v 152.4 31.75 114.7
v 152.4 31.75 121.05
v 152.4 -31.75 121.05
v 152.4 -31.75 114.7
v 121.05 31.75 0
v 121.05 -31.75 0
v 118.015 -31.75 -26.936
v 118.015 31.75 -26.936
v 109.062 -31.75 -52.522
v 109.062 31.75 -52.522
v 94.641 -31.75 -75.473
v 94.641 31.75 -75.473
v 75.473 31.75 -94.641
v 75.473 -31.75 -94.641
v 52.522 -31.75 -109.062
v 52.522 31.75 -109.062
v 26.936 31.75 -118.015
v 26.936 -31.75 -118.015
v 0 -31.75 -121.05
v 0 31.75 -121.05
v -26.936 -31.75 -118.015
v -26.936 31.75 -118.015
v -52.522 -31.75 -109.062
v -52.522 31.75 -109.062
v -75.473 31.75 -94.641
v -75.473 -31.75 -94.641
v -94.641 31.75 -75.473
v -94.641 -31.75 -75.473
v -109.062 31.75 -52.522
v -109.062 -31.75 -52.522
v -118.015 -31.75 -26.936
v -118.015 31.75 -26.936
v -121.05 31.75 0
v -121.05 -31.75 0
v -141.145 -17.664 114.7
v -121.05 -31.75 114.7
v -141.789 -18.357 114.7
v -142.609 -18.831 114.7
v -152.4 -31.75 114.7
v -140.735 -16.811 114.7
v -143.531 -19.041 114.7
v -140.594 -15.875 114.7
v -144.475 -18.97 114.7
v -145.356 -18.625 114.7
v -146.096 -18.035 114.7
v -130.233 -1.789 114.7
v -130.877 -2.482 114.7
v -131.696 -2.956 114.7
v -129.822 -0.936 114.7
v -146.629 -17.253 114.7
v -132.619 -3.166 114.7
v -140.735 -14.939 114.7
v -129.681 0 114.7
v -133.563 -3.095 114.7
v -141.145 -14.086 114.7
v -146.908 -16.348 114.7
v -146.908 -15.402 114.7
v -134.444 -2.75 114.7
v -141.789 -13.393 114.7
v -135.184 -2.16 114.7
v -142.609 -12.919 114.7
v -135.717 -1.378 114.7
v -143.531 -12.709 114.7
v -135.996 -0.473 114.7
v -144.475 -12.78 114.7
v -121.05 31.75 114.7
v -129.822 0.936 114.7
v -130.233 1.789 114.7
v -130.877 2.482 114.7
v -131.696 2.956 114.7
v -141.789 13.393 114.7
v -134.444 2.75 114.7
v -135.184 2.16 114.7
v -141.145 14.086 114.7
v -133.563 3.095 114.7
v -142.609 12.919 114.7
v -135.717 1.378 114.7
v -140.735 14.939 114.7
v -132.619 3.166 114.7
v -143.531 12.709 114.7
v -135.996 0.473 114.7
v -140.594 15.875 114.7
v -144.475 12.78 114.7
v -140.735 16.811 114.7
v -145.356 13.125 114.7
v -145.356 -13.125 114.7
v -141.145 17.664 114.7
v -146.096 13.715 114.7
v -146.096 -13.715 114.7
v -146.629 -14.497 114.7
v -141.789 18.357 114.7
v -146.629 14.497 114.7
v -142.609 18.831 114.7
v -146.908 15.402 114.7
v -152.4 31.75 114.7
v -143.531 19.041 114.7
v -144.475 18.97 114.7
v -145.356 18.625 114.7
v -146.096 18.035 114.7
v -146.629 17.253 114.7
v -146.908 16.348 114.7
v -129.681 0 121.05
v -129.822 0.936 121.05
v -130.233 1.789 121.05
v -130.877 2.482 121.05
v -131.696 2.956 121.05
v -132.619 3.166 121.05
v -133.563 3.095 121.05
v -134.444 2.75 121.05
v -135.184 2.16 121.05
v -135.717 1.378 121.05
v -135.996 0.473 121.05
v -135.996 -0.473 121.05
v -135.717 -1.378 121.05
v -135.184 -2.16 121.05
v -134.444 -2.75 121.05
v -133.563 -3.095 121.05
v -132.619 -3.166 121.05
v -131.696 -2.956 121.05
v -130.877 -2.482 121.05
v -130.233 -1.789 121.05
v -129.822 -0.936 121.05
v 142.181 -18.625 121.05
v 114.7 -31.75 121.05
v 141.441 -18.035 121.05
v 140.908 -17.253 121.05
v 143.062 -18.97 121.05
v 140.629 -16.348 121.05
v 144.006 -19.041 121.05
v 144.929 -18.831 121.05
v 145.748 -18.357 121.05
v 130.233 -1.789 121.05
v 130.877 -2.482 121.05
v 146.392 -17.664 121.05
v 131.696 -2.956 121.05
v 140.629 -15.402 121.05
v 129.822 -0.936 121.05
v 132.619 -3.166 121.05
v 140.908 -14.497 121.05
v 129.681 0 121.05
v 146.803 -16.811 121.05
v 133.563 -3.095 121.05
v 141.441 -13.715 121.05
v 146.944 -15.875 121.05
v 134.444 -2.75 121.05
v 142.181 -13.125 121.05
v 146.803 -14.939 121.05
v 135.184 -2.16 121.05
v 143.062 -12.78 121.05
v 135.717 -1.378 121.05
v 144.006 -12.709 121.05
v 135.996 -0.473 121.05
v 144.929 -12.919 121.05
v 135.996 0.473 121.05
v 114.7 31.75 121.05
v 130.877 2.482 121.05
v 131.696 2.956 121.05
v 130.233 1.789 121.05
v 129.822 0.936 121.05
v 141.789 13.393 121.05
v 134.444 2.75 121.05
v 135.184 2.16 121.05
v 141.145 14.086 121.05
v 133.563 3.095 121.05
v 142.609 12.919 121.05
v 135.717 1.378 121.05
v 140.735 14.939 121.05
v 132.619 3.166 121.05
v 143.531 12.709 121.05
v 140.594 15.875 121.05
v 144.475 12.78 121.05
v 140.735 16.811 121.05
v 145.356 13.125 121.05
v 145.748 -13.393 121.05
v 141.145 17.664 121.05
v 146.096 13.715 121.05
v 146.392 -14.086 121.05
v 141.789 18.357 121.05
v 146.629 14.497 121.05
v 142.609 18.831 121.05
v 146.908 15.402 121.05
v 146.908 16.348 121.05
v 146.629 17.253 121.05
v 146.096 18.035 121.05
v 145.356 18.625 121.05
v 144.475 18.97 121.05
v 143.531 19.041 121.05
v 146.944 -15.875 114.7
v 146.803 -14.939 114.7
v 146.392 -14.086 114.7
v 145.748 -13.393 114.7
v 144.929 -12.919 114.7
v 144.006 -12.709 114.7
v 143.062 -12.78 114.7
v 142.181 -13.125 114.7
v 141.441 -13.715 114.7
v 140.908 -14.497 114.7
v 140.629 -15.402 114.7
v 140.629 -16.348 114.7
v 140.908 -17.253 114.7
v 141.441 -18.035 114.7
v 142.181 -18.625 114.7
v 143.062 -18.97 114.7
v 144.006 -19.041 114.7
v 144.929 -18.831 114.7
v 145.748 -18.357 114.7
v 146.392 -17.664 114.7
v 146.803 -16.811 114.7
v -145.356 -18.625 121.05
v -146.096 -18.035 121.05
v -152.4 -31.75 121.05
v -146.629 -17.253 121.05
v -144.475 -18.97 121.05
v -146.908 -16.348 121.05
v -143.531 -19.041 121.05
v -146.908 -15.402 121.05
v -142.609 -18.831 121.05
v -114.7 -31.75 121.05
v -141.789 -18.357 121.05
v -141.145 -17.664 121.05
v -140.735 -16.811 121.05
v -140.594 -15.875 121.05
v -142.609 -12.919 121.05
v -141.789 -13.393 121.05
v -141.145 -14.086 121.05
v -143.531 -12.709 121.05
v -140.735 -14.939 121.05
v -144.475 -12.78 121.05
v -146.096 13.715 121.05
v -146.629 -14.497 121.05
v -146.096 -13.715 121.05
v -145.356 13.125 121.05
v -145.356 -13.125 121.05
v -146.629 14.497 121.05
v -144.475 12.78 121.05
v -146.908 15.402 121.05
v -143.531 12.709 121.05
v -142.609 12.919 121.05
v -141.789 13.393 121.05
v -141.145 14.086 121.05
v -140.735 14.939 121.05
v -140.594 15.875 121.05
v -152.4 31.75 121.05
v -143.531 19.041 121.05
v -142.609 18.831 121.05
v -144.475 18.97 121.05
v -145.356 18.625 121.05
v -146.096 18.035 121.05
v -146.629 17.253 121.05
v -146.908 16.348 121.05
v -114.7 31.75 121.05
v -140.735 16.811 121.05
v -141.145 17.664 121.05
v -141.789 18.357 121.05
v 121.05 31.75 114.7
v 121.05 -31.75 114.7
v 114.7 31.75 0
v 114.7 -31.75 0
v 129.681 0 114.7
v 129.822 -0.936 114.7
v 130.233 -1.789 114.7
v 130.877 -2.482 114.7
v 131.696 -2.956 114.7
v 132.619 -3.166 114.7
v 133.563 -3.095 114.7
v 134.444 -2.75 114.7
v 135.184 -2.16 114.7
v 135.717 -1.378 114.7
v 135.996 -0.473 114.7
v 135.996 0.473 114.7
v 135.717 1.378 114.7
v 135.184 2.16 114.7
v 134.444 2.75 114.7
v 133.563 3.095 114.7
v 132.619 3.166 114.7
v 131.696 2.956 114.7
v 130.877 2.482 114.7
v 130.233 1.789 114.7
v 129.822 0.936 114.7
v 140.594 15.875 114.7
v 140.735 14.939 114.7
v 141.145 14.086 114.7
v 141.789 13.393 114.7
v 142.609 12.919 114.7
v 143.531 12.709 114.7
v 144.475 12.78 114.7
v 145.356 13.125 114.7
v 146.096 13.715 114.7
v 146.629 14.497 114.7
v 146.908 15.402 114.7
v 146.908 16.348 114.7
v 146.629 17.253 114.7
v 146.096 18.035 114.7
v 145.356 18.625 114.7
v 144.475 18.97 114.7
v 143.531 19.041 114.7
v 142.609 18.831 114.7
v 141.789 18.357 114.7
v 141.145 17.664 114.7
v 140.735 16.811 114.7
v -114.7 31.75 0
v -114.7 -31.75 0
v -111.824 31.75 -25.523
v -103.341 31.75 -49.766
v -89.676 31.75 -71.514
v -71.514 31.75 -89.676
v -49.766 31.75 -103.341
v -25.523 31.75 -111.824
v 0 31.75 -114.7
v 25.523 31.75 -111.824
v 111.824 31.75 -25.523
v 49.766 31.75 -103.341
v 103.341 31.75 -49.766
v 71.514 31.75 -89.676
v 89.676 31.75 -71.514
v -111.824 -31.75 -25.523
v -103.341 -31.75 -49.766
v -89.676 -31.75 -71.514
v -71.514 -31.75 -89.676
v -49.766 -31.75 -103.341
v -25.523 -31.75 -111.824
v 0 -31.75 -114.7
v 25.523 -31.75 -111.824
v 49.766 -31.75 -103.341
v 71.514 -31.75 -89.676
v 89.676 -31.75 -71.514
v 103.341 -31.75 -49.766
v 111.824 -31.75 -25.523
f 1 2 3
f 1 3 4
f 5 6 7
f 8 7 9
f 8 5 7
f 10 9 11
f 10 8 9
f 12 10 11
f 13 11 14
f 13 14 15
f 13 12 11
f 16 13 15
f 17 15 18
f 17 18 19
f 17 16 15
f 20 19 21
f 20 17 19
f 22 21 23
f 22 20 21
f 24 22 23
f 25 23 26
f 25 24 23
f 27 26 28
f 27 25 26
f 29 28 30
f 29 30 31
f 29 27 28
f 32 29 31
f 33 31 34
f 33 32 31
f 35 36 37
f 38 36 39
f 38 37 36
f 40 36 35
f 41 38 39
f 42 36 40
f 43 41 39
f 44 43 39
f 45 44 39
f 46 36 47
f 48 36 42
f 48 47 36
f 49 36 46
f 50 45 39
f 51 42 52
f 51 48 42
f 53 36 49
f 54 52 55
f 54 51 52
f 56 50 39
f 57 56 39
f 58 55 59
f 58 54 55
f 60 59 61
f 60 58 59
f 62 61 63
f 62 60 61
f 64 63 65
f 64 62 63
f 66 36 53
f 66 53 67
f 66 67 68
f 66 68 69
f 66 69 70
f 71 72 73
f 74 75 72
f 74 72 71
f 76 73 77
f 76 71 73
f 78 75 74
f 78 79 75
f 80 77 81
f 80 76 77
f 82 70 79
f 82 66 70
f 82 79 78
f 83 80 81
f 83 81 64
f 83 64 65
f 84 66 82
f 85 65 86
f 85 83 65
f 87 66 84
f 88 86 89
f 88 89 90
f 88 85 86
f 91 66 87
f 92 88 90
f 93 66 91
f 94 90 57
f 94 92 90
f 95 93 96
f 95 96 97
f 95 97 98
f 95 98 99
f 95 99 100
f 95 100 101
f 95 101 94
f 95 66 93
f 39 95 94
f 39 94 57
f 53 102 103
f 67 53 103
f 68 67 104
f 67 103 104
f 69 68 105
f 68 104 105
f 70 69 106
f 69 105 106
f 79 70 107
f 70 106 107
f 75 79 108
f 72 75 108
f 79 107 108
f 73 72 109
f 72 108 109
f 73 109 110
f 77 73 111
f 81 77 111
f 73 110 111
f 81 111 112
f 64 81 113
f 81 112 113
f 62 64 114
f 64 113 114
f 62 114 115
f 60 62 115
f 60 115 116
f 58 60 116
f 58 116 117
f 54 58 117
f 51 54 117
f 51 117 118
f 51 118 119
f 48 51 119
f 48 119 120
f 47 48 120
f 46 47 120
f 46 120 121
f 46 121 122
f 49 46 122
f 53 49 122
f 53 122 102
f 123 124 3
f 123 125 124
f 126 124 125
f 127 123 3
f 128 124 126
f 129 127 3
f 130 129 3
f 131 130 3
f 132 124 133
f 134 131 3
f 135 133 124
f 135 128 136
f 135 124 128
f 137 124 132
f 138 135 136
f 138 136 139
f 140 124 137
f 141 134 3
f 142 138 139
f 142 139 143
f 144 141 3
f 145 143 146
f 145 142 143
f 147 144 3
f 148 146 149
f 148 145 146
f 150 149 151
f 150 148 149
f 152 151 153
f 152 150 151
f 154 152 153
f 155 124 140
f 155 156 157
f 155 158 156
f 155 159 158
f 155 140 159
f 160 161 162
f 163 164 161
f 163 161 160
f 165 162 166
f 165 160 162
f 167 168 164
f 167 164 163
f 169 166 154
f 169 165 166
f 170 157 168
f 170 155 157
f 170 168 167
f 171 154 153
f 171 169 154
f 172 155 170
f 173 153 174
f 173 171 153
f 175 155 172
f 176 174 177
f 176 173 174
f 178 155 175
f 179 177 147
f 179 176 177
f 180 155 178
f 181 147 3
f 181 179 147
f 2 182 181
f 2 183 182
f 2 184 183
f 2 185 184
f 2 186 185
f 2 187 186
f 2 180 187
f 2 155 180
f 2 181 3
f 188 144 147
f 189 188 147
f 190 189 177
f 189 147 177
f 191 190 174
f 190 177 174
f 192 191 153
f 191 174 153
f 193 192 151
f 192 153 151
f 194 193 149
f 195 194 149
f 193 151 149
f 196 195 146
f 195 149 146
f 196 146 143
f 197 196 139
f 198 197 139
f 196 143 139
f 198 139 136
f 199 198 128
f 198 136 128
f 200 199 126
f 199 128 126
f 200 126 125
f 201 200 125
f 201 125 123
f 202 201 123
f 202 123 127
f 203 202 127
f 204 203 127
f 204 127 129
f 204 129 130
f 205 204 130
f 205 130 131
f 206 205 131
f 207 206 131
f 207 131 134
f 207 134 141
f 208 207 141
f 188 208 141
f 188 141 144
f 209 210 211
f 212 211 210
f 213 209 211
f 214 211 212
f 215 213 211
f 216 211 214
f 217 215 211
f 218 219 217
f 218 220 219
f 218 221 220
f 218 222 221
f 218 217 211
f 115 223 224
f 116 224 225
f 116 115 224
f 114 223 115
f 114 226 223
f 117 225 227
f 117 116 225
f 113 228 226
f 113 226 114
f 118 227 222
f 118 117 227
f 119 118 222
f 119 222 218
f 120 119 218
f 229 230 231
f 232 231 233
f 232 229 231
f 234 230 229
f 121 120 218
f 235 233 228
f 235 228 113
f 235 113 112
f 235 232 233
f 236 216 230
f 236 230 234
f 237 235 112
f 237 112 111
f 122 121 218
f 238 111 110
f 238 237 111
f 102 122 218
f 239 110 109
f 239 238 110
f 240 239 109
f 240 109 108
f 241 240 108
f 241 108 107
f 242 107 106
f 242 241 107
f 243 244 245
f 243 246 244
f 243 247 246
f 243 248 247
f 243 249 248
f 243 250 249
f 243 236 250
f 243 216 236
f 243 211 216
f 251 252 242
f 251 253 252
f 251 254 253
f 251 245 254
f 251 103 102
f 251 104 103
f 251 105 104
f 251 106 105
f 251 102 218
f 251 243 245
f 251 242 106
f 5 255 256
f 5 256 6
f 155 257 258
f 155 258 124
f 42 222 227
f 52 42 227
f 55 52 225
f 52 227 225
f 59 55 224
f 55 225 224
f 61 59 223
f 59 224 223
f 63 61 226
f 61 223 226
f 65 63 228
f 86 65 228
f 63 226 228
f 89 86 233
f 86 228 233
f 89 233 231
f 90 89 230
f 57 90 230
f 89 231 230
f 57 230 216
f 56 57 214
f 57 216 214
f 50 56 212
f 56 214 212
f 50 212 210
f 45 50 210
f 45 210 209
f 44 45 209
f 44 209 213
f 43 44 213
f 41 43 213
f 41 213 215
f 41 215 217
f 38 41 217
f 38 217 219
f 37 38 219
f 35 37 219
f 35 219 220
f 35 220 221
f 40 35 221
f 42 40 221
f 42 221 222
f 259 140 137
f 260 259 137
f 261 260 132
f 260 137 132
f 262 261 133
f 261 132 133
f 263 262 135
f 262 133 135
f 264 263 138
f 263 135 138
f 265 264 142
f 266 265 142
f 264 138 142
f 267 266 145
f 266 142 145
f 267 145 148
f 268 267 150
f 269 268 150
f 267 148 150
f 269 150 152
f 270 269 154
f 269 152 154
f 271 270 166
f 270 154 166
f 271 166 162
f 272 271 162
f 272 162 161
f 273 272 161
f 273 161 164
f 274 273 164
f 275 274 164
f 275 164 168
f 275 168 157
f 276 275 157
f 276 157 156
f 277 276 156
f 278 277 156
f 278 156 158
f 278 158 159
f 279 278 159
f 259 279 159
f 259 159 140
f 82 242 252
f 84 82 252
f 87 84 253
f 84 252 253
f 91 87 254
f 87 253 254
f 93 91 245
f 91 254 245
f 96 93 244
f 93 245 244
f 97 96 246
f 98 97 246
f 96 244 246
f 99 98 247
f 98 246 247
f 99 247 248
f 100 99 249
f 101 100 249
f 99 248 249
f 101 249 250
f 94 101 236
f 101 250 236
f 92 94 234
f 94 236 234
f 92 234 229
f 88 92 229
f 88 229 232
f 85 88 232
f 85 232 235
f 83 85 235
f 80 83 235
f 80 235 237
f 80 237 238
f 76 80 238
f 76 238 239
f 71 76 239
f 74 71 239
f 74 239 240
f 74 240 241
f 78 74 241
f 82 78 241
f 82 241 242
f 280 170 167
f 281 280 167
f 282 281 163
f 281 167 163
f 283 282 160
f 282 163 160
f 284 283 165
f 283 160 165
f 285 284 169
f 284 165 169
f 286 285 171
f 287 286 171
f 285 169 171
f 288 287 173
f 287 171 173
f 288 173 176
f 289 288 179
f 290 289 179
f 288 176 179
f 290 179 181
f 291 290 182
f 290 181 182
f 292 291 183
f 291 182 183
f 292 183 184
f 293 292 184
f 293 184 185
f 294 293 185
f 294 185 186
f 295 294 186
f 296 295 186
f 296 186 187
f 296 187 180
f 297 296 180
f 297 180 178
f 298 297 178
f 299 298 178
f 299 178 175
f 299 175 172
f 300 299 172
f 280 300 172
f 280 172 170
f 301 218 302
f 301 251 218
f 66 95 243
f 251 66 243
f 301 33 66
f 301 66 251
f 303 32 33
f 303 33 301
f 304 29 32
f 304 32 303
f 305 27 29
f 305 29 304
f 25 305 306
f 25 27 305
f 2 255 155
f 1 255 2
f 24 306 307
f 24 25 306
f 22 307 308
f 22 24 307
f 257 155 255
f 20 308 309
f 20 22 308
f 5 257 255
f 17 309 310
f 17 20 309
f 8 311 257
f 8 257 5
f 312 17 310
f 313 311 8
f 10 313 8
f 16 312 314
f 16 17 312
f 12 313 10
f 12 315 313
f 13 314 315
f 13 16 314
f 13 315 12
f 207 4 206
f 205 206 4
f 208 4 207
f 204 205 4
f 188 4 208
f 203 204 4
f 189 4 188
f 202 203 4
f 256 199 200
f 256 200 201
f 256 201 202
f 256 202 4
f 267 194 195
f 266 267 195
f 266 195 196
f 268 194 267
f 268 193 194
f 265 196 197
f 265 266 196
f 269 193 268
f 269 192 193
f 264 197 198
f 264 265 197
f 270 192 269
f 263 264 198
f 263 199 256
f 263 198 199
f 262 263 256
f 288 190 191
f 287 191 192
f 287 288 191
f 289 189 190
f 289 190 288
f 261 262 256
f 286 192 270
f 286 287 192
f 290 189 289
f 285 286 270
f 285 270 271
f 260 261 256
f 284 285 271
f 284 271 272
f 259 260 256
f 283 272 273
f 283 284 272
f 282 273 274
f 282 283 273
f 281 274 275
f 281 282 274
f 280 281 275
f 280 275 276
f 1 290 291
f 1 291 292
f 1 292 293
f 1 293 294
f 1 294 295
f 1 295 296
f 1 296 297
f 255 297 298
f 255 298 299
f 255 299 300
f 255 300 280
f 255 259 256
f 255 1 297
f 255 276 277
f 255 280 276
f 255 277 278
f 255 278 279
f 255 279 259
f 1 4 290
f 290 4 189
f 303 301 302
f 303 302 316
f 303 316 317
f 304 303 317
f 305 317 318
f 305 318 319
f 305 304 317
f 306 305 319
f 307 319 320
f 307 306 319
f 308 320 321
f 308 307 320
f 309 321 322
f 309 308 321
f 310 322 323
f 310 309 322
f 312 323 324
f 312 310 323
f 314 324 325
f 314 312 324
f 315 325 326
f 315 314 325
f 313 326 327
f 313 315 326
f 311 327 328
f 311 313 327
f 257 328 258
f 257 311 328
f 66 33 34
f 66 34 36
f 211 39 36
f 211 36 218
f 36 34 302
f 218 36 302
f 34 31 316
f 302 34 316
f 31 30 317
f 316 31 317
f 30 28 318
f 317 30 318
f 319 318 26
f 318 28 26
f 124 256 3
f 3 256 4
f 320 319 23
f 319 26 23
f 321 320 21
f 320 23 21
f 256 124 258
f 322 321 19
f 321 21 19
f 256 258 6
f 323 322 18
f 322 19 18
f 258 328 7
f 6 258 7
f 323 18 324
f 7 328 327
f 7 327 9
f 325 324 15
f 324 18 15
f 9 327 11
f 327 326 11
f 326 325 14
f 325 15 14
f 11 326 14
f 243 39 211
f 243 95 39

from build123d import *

# Parameters (mm, degrees)
BOSS_EXTRUDE1_DEPTH = 31.75
SKETCH15_R          = 3.175
CUT_EXTRUDE1_DEPTH  = 288.83021471


with BuildPart() as part:
    # Sketch1 → Boss-Extrude1 (new, symmetric)
    with BuildSketch(Plane(origin=(0, 0, 0), x_dir=(1, 0, 0), z_dir=(0, 1, 0))):
        with BuildLine():
            Line((-114.7, -121.05), (-114.7, 0))
            ThreePointArc((-114.7, 0), (0, 114.7), (114.7, 0))
            Line((114.7, 0), (114.7, -121.05))
            Line((114.7, -121.05), (152.4, -121.05))
            Line((152.4, -121.05), (152.4, -114.7))
            Line((152.4, -114.7), (121.05, -114.7))
            Line((121.05, -114.7), (121.05, 0))
            ThreePointArc((121.05, 0), (0, 121.05), (-121.05, 0))
            Line((-121.05, 0), (-121.05, -12.7))
            Line((-121.05, -12.7), (-121.05, -114.7))
            Line((-121.05, -114.7), (-152.4, -114.7))
            Line((-152.4, -114.7), (-152.4, -121.05))
            Line((-152.4, -121.05), (-114.7, -121.05))
        make_face()
    extrude(amount=BOSS_EXTRUDE1_DEPTH, both=True)

    # Sketch15 → Cut-Extrude1 (cut, through all)
    with BuildSketch(Plane.XY.offset(121.05)):
        with Locations((-143.76875, 15.875)):
            Circle(SKETCH15_R)
        with Locations((-143.76875, -15.875)):
            Circle(SKETCH15_R)
        with Locations((-132.85625, 0)):
            Circle(SKETCH15_R)
        with Locations(Location((132.85625, 0, 0), (0, 0, 180))):
            Circle(SKETCH15_R)
        with Locations((143.76875, -15.875)):
            Circle(SKETCH15_R)
        with Locations(Location((143.76875, 15.875, 0), (0, 0, 180))):
            Circle(SKETCH15_R)
    extrude(amount=-CUT_EXTRUDE1_DEPTH, mode=Mode.SUBTRACT)


solid = part.part
